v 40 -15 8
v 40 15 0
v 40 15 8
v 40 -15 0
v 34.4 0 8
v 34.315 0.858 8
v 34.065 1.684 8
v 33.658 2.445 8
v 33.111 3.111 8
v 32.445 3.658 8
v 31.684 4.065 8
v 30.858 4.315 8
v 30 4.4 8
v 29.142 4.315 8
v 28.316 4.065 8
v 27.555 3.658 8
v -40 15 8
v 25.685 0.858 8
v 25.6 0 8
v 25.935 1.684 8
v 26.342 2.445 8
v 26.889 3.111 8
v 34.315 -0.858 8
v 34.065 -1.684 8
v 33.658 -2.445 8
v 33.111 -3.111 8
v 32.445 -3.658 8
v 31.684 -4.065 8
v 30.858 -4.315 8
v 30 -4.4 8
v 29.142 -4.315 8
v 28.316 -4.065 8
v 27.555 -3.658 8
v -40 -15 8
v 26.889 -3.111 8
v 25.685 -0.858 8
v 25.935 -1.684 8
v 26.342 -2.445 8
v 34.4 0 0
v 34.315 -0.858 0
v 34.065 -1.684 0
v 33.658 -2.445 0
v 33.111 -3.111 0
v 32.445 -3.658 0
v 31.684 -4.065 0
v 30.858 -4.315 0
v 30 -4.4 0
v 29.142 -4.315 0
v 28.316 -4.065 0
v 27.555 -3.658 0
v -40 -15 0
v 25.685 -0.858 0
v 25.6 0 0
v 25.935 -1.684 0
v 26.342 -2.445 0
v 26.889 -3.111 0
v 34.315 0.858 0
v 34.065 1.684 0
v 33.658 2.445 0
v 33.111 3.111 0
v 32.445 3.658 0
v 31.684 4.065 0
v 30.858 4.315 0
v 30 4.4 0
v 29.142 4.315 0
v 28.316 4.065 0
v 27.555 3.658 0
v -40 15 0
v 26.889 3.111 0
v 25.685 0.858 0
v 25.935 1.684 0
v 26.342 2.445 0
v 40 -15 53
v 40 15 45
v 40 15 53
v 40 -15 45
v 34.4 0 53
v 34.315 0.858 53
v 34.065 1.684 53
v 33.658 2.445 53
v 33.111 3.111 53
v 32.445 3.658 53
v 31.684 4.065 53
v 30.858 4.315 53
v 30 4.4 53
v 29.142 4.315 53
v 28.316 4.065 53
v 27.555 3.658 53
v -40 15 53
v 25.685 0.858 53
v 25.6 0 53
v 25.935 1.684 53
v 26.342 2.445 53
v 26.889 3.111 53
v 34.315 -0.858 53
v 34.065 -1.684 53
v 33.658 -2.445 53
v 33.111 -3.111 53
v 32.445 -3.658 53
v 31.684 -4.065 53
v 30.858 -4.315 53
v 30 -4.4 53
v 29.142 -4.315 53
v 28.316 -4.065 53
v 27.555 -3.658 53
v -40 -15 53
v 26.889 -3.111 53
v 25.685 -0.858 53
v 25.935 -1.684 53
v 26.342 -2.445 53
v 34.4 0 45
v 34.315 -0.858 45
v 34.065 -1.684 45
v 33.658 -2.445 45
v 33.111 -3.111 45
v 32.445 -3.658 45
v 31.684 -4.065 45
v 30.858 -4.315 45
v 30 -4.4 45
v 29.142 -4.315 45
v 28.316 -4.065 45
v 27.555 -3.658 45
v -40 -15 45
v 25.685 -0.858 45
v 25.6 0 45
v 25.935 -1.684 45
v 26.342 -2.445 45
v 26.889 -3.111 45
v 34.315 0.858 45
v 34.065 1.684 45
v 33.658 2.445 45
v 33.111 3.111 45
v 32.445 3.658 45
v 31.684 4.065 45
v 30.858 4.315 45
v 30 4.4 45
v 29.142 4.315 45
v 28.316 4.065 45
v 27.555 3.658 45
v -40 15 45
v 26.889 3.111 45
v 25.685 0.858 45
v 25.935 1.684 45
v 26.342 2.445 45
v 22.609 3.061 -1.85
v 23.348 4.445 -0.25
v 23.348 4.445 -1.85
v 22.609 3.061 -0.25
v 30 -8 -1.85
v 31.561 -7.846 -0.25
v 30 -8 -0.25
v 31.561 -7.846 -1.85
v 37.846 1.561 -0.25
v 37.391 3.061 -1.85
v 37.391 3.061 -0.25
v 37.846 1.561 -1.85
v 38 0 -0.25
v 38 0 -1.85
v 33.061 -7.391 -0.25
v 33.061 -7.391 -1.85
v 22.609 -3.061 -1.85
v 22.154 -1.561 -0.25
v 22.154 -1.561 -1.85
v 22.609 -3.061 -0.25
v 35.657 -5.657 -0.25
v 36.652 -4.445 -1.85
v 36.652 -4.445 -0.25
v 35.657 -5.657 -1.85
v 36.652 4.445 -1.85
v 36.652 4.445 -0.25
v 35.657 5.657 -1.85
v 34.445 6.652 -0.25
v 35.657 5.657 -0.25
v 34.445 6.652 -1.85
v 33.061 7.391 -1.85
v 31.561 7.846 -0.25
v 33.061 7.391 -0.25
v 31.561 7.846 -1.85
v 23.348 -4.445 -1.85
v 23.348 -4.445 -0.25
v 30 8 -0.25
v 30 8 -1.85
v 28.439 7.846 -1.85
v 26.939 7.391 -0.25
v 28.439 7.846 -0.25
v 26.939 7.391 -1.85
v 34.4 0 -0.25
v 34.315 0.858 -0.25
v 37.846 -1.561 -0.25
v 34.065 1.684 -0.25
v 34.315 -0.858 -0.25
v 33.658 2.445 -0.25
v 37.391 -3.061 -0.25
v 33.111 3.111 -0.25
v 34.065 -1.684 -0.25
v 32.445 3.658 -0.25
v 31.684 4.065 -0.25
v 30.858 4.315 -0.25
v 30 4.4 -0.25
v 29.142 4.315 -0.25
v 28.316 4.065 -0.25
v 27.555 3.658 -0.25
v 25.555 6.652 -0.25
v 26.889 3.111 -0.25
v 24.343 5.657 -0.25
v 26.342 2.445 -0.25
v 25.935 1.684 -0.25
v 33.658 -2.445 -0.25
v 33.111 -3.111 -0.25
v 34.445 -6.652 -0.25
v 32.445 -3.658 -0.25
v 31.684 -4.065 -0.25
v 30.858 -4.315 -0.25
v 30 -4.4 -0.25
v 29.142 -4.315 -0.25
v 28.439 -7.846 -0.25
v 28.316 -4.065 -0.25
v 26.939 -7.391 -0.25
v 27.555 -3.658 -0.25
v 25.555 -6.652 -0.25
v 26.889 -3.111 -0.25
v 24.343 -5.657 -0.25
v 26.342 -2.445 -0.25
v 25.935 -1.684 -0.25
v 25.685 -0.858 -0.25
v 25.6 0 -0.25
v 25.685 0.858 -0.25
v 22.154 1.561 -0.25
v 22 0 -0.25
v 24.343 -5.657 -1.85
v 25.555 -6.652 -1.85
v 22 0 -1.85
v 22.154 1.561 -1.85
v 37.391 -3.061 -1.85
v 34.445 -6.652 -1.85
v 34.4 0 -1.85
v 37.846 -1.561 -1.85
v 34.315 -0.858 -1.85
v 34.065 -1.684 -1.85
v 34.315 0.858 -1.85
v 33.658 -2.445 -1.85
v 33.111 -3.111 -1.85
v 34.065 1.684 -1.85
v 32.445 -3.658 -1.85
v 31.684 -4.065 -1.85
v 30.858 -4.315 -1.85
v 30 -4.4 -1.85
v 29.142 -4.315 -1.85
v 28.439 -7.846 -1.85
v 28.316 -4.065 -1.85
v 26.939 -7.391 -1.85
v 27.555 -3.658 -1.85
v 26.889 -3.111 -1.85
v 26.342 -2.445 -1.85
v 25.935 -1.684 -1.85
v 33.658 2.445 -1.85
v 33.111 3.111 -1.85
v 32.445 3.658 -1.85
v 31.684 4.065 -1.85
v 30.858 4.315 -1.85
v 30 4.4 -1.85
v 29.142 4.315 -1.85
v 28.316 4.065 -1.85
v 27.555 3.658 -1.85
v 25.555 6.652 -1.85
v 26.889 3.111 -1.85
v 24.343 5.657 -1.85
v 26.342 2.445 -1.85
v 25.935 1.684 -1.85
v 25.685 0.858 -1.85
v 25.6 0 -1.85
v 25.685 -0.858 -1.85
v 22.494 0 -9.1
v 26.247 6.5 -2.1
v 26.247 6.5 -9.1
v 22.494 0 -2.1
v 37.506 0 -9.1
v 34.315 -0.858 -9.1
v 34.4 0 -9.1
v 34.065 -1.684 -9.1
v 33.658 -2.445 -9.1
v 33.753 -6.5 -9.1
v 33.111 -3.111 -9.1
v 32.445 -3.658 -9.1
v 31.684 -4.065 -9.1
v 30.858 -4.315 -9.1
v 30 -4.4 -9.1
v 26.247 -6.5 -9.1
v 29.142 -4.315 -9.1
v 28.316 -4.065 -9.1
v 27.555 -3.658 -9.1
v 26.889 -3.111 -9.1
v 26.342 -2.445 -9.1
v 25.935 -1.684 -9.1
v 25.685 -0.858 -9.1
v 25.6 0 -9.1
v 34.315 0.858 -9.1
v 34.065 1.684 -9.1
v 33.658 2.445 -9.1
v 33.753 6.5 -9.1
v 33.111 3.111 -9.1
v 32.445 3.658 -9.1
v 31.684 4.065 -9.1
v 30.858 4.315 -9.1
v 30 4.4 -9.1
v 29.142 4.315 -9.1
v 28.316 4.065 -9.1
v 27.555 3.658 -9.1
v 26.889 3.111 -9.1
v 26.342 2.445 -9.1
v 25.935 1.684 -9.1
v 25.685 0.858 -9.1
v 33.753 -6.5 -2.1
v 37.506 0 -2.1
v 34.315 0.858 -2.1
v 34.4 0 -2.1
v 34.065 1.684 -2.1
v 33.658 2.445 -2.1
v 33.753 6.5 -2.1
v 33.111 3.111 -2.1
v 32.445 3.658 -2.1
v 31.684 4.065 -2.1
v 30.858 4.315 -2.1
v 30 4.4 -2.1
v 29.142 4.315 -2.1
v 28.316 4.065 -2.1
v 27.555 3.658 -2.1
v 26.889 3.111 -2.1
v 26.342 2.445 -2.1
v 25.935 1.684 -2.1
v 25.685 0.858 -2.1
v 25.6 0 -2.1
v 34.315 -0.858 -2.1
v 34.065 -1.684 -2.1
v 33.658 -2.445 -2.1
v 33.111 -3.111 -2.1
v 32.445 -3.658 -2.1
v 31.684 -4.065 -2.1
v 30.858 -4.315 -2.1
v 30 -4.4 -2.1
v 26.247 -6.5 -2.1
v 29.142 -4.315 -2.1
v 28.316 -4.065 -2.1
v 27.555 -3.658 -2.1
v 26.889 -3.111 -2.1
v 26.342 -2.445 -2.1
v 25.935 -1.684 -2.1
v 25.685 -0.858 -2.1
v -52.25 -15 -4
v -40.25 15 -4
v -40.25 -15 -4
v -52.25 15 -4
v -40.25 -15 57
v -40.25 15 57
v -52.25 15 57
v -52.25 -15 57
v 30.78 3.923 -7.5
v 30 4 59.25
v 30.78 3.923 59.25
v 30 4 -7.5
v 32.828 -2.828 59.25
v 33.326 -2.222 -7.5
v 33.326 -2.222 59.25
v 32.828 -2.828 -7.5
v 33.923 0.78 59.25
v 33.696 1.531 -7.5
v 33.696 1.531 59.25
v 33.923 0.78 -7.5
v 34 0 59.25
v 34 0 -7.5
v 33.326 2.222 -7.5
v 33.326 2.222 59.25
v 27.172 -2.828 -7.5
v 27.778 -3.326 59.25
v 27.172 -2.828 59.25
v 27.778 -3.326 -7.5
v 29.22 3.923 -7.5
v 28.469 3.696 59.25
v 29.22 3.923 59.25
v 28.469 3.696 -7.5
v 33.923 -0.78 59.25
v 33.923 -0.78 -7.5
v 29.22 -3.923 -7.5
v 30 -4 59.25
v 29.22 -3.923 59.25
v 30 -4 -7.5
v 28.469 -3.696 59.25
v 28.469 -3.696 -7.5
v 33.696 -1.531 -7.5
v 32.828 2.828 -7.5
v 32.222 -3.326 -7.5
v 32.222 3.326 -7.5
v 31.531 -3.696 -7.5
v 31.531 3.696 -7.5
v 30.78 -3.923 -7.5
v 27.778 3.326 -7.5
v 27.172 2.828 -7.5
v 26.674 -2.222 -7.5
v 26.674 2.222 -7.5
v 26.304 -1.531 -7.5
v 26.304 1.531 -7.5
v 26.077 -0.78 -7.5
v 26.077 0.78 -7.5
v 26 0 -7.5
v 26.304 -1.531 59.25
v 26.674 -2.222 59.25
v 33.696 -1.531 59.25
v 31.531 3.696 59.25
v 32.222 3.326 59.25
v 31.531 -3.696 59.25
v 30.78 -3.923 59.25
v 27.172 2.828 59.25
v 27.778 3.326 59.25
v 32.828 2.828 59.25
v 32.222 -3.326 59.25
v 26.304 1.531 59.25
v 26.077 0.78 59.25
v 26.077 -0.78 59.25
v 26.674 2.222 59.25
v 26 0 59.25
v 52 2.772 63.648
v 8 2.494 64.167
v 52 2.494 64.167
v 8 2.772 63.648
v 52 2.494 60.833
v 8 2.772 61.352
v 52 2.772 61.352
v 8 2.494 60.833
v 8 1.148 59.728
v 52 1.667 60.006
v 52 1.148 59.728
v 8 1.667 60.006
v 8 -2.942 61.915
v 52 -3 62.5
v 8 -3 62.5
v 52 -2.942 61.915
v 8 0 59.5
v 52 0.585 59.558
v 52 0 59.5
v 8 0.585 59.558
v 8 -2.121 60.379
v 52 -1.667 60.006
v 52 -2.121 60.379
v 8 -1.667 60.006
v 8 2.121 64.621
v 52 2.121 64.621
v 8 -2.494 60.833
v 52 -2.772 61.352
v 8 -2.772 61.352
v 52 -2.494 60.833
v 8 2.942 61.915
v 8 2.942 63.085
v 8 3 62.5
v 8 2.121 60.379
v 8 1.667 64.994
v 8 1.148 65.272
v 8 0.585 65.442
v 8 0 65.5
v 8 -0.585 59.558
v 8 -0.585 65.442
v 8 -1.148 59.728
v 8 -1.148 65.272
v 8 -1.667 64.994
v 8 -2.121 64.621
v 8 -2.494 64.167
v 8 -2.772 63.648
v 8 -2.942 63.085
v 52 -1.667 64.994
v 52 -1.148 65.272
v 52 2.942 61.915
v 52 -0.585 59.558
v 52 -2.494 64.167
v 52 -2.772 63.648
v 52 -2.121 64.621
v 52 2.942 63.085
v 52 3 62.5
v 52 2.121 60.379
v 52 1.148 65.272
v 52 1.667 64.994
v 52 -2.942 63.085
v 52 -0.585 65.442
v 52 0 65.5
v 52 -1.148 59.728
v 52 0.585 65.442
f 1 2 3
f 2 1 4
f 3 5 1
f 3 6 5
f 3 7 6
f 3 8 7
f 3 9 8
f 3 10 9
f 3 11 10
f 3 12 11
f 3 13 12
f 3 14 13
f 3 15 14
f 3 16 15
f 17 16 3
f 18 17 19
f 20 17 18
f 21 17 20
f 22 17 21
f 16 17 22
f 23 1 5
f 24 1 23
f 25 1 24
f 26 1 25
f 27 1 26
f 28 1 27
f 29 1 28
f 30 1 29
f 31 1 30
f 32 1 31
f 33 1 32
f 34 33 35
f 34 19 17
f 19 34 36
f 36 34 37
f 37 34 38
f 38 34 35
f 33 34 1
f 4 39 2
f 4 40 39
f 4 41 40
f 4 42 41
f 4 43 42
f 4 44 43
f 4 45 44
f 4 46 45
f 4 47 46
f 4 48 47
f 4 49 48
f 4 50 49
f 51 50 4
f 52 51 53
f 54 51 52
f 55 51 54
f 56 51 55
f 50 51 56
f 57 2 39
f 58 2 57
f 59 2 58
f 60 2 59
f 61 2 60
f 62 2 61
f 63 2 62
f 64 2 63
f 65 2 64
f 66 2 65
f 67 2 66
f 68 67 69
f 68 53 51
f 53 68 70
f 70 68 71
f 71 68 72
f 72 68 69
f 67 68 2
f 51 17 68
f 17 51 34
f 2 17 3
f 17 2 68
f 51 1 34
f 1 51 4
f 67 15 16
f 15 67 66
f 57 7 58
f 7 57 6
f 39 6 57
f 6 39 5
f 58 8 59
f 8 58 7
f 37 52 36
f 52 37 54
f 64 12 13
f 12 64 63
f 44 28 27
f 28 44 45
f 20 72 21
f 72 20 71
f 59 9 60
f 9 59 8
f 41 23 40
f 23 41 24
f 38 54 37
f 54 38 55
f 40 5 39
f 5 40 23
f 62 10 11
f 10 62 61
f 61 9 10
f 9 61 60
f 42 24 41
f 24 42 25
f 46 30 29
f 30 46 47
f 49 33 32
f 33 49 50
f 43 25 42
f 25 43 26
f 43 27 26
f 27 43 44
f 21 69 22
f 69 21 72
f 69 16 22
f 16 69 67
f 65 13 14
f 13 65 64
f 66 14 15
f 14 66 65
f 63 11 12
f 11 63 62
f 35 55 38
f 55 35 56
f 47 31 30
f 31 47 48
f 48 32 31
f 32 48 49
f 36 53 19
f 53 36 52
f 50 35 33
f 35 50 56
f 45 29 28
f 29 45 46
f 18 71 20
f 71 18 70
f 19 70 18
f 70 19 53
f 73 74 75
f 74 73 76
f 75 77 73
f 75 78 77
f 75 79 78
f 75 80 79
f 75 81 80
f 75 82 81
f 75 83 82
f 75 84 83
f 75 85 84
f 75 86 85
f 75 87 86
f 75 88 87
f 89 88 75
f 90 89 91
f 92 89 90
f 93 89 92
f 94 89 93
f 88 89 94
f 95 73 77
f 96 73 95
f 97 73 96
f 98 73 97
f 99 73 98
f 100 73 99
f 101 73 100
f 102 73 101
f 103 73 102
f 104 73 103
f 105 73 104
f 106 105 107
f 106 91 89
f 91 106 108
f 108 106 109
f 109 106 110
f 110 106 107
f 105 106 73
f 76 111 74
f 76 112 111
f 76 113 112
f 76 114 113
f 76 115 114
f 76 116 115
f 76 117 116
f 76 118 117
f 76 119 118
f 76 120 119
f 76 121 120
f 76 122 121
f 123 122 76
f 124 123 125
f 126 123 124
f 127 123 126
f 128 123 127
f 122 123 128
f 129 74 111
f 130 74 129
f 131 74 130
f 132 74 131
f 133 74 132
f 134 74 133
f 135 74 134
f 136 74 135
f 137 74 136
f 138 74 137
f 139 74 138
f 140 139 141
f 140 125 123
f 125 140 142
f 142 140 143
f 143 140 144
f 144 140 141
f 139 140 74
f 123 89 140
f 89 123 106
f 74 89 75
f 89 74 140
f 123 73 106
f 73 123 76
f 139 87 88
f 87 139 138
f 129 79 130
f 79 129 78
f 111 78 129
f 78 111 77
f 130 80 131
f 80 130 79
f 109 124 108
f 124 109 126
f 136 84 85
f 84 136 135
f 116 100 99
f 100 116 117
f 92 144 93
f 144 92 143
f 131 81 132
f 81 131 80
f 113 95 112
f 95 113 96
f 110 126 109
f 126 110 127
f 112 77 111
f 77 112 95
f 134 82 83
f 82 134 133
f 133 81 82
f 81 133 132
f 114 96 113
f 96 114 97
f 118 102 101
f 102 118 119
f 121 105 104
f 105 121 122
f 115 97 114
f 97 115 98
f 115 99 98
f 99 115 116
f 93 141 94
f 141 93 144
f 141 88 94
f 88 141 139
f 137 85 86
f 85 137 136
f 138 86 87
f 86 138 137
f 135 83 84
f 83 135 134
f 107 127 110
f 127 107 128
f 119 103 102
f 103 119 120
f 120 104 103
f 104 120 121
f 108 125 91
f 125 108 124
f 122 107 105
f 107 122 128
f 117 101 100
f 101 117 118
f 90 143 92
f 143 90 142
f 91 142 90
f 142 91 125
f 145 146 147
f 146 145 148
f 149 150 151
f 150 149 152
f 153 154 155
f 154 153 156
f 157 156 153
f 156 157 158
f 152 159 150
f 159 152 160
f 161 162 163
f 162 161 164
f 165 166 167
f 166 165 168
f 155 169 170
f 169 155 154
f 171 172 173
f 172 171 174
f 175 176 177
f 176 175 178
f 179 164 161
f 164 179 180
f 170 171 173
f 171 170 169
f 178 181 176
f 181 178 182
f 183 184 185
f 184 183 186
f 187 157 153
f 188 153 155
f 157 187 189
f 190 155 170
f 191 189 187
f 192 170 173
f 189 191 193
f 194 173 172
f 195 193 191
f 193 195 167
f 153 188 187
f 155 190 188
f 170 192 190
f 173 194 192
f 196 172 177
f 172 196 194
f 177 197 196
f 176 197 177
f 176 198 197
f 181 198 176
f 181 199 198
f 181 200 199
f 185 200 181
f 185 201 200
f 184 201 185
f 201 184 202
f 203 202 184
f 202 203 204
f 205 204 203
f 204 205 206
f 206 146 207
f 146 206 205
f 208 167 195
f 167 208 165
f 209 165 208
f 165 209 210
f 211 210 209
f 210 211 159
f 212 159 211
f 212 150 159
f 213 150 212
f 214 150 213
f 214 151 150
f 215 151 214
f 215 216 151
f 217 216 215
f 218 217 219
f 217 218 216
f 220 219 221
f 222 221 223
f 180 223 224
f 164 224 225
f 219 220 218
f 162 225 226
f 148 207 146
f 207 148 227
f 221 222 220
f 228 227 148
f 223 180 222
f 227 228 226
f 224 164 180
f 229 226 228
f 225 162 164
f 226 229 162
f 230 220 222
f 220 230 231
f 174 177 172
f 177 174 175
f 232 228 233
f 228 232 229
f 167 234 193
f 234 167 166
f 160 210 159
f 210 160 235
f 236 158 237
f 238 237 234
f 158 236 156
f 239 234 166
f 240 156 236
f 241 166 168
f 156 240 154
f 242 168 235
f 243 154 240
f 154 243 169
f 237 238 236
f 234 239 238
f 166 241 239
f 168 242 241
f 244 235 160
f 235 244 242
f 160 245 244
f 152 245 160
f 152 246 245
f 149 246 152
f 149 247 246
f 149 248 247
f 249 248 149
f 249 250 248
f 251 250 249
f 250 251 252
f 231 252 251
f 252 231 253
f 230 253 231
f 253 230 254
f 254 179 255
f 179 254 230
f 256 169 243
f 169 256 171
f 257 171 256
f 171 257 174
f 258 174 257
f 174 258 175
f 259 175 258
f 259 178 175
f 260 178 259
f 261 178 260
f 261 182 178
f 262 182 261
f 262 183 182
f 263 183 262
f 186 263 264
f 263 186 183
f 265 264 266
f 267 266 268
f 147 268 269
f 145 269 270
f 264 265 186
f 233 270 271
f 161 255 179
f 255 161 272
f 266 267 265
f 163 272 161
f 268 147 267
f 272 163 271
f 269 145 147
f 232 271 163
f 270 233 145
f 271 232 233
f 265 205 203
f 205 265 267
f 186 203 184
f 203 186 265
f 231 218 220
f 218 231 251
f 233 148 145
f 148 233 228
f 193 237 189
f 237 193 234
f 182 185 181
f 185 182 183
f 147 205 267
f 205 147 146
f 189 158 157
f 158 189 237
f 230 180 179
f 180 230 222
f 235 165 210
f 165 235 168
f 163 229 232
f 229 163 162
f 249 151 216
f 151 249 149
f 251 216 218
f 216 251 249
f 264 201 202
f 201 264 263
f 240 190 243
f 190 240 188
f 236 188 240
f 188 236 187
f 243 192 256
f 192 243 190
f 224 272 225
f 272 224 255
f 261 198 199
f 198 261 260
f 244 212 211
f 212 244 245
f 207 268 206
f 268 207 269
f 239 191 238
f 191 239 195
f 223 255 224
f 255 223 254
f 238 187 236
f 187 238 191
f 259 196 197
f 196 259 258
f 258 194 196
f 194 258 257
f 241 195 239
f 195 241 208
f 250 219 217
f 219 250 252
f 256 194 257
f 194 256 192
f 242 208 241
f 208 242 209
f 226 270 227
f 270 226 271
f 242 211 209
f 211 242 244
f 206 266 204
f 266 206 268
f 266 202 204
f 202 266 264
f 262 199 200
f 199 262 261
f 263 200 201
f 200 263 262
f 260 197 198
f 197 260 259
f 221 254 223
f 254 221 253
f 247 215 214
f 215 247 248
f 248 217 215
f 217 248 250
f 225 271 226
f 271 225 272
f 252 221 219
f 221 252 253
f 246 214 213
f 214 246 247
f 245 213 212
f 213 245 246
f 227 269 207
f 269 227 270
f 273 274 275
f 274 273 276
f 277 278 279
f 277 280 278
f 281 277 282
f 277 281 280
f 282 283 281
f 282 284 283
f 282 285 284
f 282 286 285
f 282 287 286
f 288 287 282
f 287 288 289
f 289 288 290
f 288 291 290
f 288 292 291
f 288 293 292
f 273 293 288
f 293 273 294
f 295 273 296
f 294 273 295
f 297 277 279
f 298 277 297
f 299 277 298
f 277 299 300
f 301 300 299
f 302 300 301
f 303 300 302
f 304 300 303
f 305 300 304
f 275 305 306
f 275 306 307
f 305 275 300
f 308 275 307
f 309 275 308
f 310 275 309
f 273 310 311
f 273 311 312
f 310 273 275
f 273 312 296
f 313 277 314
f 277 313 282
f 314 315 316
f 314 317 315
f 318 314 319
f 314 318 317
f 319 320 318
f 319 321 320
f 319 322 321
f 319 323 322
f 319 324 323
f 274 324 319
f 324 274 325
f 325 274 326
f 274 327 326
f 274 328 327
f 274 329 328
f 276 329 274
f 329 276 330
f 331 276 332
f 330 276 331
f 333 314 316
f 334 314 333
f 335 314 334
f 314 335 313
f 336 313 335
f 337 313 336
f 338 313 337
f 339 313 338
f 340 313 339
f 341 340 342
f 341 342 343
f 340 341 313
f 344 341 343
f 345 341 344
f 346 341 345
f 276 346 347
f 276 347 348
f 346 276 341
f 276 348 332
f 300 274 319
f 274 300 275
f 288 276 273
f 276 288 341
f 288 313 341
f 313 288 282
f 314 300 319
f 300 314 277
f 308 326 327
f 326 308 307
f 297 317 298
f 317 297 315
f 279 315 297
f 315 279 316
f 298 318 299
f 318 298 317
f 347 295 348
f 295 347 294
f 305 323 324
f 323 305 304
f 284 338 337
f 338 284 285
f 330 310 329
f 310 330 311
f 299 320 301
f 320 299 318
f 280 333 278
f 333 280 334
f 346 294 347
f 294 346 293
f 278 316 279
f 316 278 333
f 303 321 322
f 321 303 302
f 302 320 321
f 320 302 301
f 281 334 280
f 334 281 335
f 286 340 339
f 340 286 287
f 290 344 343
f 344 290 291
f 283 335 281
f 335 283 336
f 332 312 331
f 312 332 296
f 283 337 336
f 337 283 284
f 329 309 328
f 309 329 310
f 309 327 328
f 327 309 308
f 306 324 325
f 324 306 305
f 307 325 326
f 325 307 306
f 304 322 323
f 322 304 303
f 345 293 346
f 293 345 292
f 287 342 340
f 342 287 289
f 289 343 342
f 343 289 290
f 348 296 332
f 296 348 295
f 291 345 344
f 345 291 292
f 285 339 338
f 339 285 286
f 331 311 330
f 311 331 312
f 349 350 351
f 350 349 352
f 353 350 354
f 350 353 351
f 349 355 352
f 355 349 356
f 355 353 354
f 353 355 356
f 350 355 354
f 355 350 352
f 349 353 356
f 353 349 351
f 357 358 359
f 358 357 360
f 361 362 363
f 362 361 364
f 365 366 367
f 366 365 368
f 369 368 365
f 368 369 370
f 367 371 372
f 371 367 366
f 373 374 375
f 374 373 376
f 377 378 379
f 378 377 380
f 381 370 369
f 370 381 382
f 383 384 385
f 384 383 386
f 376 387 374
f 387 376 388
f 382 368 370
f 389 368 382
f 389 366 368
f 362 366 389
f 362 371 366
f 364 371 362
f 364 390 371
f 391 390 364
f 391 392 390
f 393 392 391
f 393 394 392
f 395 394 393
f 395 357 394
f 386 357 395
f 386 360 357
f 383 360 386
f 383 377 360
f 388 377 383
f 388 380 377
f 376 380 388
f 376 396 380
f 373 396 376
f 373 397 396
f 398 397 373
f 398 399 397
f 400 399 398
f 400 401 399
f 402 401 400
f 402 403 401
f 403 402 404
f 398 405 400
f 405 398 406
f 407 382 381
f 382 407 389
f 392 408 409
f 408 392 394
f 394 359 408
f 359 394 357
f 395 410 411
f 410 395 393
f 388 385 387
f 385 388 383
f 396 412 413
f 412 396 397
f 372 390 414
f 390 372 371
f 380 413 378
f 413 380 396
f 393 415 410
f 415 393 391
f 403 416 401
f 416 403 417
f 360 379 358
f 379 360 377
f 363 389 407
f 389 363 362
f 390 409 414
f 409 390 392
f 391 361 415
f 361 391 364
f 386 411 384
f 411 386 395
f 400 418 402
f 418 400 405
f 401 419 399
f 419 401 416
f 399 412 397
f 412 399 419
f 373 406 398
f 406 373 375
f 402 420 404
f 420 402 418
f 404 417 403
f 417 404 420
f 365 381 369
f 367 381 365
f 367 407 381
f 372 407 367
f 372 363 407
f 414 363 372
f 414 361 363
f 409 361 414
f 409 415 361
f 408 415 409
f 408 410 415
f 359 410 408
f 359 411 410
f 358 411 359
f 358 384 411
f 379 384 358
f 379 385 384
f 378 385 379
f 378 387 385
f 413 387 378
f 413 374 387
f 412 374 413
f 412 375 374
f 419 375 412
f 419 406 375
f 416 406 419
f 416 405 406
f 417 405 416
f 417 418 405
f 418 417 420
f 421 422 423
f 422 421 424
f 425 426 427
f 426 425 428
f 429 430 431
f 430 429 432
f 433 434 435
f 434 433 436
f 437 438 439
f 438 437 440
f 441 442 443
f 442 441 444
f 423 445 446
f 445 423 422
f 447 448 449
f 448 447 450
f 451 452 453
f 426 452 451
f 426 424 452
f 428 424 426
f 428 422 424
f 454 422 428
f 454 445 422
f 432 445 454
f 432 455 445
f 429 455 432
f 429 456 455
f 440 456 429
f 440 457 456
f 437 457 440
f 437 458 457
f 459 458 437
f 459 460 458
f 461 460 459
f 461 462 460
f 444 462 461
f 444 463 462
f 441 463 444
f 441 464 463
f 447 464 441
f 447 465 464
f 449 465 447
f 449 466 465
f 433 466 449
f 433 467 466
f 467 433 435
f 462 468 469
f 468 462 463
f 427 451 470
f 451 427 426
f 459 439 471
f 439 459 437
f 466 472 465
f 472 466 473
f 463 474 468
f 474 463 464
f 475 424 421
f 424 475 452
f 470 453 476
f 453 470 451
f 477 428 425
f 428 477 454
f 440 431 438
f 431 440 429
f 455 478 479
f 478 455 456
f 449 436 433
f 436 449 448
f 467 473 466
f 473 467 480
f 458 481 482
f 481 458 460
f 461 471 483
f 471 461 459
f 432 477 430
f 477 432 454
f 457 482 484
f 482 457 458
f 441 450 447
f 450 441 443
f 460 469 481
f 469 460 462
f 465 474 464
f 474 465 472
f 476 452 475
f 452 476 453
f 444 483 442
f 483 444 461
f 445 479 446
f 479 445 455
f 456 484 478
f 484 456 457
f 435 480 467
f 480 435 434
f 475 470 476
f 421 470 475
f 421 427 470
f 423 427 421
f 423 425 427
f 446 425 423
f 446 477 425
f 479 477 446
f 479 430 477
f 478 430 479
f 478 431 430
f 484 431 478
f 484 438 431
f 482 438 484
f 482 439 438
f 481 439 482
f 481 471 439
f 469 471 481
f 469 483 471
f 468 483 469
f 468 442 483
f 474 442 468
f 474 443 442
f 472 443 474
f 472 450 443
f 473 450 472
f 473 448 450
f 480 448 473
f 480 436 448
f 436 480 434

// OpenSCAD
$fn = 32;

// ------------------------------------------------------------------------
// C clamp: throat 45 mm, screw d8
// Every part is its own module, assembly() places every instance.
// ------------------------------------------------------------------------

// --- part 1 ---
module clamp_arm() {
  difference() {
    translate([-40, -15, 0]) cube([80, 30, 8]);
    translate([30, 0, -1]) cylinder(h = 10, d = 8.8);
  }
}

// --- part 2 ---
module clamp_spine() {
  difference() {
    translate([-30.5, -15, 0]) cube([61, 30, 12]);
  }
}

// --- part 3 ---
module clamp_screw() {
  translate([0, 0, -33.375]) cylinder(h = 66.75, d = 8);
}

// --- part 4 ---
module clamp_washer() {
  difference() {
      translate([0, 0, 0]) cylinder(h = 1.6, d = 16);
      translate([0, 0, -1]) cylinder(h = 3.6, d = 8.8);
    }
}

// --- part 5 ---
module clamp_nut() {
  difference() {
    linear_extrude(height = 7) polygon(points = [[7.506, 0], [3.753, 6.5], [-3.753, 6.5], [-7.506, 0], [-3.753, -6.5], [3.753, -6.5]]);
    translate([0, 0, -1]) cylinder(h = 9, d = 8.8);
  }
}

// --- part 6 ---
module tommy_bar() {
  translate([0, 0, -22]) cylinder(h = 44, d = 6);
}

// --- assembly ---
module assembly() {
  color([0.80, 0.24, 0.20]) translate([0, 0, 0]) rotate([0, 0, 0]) clamp_arm();
  color([0.20, 0.45, 0.75]) translate([0, 0, 45]) rotate([0, 0, 0]) clamp_arm();
  color([0.25, 0.62, 0.32]) translate([-52.25, 0, 26.5]) rotate([0, 90, 0]) clamp_spine();
  color([0.92, 0.70, 0.18]) translate([30, 0, 25.875]) rotate([0, 0, 0]) clamp_screw();
  color([0.58, 0.35, 0.70]) translate([30, 0, -1.85]) rotate([0, 0, 0]) clamp_washer();
  color([0.16, 0.66, 0.66]) translate([30, 0, -9.1]) rotate([0, 0, 0]) clamp_nut();
  color([0.85, 0.48, 0.18]) translate([30, 0, 62.5]) rotate([0, 90, 0]) tommy_bar();
}

assembly();
